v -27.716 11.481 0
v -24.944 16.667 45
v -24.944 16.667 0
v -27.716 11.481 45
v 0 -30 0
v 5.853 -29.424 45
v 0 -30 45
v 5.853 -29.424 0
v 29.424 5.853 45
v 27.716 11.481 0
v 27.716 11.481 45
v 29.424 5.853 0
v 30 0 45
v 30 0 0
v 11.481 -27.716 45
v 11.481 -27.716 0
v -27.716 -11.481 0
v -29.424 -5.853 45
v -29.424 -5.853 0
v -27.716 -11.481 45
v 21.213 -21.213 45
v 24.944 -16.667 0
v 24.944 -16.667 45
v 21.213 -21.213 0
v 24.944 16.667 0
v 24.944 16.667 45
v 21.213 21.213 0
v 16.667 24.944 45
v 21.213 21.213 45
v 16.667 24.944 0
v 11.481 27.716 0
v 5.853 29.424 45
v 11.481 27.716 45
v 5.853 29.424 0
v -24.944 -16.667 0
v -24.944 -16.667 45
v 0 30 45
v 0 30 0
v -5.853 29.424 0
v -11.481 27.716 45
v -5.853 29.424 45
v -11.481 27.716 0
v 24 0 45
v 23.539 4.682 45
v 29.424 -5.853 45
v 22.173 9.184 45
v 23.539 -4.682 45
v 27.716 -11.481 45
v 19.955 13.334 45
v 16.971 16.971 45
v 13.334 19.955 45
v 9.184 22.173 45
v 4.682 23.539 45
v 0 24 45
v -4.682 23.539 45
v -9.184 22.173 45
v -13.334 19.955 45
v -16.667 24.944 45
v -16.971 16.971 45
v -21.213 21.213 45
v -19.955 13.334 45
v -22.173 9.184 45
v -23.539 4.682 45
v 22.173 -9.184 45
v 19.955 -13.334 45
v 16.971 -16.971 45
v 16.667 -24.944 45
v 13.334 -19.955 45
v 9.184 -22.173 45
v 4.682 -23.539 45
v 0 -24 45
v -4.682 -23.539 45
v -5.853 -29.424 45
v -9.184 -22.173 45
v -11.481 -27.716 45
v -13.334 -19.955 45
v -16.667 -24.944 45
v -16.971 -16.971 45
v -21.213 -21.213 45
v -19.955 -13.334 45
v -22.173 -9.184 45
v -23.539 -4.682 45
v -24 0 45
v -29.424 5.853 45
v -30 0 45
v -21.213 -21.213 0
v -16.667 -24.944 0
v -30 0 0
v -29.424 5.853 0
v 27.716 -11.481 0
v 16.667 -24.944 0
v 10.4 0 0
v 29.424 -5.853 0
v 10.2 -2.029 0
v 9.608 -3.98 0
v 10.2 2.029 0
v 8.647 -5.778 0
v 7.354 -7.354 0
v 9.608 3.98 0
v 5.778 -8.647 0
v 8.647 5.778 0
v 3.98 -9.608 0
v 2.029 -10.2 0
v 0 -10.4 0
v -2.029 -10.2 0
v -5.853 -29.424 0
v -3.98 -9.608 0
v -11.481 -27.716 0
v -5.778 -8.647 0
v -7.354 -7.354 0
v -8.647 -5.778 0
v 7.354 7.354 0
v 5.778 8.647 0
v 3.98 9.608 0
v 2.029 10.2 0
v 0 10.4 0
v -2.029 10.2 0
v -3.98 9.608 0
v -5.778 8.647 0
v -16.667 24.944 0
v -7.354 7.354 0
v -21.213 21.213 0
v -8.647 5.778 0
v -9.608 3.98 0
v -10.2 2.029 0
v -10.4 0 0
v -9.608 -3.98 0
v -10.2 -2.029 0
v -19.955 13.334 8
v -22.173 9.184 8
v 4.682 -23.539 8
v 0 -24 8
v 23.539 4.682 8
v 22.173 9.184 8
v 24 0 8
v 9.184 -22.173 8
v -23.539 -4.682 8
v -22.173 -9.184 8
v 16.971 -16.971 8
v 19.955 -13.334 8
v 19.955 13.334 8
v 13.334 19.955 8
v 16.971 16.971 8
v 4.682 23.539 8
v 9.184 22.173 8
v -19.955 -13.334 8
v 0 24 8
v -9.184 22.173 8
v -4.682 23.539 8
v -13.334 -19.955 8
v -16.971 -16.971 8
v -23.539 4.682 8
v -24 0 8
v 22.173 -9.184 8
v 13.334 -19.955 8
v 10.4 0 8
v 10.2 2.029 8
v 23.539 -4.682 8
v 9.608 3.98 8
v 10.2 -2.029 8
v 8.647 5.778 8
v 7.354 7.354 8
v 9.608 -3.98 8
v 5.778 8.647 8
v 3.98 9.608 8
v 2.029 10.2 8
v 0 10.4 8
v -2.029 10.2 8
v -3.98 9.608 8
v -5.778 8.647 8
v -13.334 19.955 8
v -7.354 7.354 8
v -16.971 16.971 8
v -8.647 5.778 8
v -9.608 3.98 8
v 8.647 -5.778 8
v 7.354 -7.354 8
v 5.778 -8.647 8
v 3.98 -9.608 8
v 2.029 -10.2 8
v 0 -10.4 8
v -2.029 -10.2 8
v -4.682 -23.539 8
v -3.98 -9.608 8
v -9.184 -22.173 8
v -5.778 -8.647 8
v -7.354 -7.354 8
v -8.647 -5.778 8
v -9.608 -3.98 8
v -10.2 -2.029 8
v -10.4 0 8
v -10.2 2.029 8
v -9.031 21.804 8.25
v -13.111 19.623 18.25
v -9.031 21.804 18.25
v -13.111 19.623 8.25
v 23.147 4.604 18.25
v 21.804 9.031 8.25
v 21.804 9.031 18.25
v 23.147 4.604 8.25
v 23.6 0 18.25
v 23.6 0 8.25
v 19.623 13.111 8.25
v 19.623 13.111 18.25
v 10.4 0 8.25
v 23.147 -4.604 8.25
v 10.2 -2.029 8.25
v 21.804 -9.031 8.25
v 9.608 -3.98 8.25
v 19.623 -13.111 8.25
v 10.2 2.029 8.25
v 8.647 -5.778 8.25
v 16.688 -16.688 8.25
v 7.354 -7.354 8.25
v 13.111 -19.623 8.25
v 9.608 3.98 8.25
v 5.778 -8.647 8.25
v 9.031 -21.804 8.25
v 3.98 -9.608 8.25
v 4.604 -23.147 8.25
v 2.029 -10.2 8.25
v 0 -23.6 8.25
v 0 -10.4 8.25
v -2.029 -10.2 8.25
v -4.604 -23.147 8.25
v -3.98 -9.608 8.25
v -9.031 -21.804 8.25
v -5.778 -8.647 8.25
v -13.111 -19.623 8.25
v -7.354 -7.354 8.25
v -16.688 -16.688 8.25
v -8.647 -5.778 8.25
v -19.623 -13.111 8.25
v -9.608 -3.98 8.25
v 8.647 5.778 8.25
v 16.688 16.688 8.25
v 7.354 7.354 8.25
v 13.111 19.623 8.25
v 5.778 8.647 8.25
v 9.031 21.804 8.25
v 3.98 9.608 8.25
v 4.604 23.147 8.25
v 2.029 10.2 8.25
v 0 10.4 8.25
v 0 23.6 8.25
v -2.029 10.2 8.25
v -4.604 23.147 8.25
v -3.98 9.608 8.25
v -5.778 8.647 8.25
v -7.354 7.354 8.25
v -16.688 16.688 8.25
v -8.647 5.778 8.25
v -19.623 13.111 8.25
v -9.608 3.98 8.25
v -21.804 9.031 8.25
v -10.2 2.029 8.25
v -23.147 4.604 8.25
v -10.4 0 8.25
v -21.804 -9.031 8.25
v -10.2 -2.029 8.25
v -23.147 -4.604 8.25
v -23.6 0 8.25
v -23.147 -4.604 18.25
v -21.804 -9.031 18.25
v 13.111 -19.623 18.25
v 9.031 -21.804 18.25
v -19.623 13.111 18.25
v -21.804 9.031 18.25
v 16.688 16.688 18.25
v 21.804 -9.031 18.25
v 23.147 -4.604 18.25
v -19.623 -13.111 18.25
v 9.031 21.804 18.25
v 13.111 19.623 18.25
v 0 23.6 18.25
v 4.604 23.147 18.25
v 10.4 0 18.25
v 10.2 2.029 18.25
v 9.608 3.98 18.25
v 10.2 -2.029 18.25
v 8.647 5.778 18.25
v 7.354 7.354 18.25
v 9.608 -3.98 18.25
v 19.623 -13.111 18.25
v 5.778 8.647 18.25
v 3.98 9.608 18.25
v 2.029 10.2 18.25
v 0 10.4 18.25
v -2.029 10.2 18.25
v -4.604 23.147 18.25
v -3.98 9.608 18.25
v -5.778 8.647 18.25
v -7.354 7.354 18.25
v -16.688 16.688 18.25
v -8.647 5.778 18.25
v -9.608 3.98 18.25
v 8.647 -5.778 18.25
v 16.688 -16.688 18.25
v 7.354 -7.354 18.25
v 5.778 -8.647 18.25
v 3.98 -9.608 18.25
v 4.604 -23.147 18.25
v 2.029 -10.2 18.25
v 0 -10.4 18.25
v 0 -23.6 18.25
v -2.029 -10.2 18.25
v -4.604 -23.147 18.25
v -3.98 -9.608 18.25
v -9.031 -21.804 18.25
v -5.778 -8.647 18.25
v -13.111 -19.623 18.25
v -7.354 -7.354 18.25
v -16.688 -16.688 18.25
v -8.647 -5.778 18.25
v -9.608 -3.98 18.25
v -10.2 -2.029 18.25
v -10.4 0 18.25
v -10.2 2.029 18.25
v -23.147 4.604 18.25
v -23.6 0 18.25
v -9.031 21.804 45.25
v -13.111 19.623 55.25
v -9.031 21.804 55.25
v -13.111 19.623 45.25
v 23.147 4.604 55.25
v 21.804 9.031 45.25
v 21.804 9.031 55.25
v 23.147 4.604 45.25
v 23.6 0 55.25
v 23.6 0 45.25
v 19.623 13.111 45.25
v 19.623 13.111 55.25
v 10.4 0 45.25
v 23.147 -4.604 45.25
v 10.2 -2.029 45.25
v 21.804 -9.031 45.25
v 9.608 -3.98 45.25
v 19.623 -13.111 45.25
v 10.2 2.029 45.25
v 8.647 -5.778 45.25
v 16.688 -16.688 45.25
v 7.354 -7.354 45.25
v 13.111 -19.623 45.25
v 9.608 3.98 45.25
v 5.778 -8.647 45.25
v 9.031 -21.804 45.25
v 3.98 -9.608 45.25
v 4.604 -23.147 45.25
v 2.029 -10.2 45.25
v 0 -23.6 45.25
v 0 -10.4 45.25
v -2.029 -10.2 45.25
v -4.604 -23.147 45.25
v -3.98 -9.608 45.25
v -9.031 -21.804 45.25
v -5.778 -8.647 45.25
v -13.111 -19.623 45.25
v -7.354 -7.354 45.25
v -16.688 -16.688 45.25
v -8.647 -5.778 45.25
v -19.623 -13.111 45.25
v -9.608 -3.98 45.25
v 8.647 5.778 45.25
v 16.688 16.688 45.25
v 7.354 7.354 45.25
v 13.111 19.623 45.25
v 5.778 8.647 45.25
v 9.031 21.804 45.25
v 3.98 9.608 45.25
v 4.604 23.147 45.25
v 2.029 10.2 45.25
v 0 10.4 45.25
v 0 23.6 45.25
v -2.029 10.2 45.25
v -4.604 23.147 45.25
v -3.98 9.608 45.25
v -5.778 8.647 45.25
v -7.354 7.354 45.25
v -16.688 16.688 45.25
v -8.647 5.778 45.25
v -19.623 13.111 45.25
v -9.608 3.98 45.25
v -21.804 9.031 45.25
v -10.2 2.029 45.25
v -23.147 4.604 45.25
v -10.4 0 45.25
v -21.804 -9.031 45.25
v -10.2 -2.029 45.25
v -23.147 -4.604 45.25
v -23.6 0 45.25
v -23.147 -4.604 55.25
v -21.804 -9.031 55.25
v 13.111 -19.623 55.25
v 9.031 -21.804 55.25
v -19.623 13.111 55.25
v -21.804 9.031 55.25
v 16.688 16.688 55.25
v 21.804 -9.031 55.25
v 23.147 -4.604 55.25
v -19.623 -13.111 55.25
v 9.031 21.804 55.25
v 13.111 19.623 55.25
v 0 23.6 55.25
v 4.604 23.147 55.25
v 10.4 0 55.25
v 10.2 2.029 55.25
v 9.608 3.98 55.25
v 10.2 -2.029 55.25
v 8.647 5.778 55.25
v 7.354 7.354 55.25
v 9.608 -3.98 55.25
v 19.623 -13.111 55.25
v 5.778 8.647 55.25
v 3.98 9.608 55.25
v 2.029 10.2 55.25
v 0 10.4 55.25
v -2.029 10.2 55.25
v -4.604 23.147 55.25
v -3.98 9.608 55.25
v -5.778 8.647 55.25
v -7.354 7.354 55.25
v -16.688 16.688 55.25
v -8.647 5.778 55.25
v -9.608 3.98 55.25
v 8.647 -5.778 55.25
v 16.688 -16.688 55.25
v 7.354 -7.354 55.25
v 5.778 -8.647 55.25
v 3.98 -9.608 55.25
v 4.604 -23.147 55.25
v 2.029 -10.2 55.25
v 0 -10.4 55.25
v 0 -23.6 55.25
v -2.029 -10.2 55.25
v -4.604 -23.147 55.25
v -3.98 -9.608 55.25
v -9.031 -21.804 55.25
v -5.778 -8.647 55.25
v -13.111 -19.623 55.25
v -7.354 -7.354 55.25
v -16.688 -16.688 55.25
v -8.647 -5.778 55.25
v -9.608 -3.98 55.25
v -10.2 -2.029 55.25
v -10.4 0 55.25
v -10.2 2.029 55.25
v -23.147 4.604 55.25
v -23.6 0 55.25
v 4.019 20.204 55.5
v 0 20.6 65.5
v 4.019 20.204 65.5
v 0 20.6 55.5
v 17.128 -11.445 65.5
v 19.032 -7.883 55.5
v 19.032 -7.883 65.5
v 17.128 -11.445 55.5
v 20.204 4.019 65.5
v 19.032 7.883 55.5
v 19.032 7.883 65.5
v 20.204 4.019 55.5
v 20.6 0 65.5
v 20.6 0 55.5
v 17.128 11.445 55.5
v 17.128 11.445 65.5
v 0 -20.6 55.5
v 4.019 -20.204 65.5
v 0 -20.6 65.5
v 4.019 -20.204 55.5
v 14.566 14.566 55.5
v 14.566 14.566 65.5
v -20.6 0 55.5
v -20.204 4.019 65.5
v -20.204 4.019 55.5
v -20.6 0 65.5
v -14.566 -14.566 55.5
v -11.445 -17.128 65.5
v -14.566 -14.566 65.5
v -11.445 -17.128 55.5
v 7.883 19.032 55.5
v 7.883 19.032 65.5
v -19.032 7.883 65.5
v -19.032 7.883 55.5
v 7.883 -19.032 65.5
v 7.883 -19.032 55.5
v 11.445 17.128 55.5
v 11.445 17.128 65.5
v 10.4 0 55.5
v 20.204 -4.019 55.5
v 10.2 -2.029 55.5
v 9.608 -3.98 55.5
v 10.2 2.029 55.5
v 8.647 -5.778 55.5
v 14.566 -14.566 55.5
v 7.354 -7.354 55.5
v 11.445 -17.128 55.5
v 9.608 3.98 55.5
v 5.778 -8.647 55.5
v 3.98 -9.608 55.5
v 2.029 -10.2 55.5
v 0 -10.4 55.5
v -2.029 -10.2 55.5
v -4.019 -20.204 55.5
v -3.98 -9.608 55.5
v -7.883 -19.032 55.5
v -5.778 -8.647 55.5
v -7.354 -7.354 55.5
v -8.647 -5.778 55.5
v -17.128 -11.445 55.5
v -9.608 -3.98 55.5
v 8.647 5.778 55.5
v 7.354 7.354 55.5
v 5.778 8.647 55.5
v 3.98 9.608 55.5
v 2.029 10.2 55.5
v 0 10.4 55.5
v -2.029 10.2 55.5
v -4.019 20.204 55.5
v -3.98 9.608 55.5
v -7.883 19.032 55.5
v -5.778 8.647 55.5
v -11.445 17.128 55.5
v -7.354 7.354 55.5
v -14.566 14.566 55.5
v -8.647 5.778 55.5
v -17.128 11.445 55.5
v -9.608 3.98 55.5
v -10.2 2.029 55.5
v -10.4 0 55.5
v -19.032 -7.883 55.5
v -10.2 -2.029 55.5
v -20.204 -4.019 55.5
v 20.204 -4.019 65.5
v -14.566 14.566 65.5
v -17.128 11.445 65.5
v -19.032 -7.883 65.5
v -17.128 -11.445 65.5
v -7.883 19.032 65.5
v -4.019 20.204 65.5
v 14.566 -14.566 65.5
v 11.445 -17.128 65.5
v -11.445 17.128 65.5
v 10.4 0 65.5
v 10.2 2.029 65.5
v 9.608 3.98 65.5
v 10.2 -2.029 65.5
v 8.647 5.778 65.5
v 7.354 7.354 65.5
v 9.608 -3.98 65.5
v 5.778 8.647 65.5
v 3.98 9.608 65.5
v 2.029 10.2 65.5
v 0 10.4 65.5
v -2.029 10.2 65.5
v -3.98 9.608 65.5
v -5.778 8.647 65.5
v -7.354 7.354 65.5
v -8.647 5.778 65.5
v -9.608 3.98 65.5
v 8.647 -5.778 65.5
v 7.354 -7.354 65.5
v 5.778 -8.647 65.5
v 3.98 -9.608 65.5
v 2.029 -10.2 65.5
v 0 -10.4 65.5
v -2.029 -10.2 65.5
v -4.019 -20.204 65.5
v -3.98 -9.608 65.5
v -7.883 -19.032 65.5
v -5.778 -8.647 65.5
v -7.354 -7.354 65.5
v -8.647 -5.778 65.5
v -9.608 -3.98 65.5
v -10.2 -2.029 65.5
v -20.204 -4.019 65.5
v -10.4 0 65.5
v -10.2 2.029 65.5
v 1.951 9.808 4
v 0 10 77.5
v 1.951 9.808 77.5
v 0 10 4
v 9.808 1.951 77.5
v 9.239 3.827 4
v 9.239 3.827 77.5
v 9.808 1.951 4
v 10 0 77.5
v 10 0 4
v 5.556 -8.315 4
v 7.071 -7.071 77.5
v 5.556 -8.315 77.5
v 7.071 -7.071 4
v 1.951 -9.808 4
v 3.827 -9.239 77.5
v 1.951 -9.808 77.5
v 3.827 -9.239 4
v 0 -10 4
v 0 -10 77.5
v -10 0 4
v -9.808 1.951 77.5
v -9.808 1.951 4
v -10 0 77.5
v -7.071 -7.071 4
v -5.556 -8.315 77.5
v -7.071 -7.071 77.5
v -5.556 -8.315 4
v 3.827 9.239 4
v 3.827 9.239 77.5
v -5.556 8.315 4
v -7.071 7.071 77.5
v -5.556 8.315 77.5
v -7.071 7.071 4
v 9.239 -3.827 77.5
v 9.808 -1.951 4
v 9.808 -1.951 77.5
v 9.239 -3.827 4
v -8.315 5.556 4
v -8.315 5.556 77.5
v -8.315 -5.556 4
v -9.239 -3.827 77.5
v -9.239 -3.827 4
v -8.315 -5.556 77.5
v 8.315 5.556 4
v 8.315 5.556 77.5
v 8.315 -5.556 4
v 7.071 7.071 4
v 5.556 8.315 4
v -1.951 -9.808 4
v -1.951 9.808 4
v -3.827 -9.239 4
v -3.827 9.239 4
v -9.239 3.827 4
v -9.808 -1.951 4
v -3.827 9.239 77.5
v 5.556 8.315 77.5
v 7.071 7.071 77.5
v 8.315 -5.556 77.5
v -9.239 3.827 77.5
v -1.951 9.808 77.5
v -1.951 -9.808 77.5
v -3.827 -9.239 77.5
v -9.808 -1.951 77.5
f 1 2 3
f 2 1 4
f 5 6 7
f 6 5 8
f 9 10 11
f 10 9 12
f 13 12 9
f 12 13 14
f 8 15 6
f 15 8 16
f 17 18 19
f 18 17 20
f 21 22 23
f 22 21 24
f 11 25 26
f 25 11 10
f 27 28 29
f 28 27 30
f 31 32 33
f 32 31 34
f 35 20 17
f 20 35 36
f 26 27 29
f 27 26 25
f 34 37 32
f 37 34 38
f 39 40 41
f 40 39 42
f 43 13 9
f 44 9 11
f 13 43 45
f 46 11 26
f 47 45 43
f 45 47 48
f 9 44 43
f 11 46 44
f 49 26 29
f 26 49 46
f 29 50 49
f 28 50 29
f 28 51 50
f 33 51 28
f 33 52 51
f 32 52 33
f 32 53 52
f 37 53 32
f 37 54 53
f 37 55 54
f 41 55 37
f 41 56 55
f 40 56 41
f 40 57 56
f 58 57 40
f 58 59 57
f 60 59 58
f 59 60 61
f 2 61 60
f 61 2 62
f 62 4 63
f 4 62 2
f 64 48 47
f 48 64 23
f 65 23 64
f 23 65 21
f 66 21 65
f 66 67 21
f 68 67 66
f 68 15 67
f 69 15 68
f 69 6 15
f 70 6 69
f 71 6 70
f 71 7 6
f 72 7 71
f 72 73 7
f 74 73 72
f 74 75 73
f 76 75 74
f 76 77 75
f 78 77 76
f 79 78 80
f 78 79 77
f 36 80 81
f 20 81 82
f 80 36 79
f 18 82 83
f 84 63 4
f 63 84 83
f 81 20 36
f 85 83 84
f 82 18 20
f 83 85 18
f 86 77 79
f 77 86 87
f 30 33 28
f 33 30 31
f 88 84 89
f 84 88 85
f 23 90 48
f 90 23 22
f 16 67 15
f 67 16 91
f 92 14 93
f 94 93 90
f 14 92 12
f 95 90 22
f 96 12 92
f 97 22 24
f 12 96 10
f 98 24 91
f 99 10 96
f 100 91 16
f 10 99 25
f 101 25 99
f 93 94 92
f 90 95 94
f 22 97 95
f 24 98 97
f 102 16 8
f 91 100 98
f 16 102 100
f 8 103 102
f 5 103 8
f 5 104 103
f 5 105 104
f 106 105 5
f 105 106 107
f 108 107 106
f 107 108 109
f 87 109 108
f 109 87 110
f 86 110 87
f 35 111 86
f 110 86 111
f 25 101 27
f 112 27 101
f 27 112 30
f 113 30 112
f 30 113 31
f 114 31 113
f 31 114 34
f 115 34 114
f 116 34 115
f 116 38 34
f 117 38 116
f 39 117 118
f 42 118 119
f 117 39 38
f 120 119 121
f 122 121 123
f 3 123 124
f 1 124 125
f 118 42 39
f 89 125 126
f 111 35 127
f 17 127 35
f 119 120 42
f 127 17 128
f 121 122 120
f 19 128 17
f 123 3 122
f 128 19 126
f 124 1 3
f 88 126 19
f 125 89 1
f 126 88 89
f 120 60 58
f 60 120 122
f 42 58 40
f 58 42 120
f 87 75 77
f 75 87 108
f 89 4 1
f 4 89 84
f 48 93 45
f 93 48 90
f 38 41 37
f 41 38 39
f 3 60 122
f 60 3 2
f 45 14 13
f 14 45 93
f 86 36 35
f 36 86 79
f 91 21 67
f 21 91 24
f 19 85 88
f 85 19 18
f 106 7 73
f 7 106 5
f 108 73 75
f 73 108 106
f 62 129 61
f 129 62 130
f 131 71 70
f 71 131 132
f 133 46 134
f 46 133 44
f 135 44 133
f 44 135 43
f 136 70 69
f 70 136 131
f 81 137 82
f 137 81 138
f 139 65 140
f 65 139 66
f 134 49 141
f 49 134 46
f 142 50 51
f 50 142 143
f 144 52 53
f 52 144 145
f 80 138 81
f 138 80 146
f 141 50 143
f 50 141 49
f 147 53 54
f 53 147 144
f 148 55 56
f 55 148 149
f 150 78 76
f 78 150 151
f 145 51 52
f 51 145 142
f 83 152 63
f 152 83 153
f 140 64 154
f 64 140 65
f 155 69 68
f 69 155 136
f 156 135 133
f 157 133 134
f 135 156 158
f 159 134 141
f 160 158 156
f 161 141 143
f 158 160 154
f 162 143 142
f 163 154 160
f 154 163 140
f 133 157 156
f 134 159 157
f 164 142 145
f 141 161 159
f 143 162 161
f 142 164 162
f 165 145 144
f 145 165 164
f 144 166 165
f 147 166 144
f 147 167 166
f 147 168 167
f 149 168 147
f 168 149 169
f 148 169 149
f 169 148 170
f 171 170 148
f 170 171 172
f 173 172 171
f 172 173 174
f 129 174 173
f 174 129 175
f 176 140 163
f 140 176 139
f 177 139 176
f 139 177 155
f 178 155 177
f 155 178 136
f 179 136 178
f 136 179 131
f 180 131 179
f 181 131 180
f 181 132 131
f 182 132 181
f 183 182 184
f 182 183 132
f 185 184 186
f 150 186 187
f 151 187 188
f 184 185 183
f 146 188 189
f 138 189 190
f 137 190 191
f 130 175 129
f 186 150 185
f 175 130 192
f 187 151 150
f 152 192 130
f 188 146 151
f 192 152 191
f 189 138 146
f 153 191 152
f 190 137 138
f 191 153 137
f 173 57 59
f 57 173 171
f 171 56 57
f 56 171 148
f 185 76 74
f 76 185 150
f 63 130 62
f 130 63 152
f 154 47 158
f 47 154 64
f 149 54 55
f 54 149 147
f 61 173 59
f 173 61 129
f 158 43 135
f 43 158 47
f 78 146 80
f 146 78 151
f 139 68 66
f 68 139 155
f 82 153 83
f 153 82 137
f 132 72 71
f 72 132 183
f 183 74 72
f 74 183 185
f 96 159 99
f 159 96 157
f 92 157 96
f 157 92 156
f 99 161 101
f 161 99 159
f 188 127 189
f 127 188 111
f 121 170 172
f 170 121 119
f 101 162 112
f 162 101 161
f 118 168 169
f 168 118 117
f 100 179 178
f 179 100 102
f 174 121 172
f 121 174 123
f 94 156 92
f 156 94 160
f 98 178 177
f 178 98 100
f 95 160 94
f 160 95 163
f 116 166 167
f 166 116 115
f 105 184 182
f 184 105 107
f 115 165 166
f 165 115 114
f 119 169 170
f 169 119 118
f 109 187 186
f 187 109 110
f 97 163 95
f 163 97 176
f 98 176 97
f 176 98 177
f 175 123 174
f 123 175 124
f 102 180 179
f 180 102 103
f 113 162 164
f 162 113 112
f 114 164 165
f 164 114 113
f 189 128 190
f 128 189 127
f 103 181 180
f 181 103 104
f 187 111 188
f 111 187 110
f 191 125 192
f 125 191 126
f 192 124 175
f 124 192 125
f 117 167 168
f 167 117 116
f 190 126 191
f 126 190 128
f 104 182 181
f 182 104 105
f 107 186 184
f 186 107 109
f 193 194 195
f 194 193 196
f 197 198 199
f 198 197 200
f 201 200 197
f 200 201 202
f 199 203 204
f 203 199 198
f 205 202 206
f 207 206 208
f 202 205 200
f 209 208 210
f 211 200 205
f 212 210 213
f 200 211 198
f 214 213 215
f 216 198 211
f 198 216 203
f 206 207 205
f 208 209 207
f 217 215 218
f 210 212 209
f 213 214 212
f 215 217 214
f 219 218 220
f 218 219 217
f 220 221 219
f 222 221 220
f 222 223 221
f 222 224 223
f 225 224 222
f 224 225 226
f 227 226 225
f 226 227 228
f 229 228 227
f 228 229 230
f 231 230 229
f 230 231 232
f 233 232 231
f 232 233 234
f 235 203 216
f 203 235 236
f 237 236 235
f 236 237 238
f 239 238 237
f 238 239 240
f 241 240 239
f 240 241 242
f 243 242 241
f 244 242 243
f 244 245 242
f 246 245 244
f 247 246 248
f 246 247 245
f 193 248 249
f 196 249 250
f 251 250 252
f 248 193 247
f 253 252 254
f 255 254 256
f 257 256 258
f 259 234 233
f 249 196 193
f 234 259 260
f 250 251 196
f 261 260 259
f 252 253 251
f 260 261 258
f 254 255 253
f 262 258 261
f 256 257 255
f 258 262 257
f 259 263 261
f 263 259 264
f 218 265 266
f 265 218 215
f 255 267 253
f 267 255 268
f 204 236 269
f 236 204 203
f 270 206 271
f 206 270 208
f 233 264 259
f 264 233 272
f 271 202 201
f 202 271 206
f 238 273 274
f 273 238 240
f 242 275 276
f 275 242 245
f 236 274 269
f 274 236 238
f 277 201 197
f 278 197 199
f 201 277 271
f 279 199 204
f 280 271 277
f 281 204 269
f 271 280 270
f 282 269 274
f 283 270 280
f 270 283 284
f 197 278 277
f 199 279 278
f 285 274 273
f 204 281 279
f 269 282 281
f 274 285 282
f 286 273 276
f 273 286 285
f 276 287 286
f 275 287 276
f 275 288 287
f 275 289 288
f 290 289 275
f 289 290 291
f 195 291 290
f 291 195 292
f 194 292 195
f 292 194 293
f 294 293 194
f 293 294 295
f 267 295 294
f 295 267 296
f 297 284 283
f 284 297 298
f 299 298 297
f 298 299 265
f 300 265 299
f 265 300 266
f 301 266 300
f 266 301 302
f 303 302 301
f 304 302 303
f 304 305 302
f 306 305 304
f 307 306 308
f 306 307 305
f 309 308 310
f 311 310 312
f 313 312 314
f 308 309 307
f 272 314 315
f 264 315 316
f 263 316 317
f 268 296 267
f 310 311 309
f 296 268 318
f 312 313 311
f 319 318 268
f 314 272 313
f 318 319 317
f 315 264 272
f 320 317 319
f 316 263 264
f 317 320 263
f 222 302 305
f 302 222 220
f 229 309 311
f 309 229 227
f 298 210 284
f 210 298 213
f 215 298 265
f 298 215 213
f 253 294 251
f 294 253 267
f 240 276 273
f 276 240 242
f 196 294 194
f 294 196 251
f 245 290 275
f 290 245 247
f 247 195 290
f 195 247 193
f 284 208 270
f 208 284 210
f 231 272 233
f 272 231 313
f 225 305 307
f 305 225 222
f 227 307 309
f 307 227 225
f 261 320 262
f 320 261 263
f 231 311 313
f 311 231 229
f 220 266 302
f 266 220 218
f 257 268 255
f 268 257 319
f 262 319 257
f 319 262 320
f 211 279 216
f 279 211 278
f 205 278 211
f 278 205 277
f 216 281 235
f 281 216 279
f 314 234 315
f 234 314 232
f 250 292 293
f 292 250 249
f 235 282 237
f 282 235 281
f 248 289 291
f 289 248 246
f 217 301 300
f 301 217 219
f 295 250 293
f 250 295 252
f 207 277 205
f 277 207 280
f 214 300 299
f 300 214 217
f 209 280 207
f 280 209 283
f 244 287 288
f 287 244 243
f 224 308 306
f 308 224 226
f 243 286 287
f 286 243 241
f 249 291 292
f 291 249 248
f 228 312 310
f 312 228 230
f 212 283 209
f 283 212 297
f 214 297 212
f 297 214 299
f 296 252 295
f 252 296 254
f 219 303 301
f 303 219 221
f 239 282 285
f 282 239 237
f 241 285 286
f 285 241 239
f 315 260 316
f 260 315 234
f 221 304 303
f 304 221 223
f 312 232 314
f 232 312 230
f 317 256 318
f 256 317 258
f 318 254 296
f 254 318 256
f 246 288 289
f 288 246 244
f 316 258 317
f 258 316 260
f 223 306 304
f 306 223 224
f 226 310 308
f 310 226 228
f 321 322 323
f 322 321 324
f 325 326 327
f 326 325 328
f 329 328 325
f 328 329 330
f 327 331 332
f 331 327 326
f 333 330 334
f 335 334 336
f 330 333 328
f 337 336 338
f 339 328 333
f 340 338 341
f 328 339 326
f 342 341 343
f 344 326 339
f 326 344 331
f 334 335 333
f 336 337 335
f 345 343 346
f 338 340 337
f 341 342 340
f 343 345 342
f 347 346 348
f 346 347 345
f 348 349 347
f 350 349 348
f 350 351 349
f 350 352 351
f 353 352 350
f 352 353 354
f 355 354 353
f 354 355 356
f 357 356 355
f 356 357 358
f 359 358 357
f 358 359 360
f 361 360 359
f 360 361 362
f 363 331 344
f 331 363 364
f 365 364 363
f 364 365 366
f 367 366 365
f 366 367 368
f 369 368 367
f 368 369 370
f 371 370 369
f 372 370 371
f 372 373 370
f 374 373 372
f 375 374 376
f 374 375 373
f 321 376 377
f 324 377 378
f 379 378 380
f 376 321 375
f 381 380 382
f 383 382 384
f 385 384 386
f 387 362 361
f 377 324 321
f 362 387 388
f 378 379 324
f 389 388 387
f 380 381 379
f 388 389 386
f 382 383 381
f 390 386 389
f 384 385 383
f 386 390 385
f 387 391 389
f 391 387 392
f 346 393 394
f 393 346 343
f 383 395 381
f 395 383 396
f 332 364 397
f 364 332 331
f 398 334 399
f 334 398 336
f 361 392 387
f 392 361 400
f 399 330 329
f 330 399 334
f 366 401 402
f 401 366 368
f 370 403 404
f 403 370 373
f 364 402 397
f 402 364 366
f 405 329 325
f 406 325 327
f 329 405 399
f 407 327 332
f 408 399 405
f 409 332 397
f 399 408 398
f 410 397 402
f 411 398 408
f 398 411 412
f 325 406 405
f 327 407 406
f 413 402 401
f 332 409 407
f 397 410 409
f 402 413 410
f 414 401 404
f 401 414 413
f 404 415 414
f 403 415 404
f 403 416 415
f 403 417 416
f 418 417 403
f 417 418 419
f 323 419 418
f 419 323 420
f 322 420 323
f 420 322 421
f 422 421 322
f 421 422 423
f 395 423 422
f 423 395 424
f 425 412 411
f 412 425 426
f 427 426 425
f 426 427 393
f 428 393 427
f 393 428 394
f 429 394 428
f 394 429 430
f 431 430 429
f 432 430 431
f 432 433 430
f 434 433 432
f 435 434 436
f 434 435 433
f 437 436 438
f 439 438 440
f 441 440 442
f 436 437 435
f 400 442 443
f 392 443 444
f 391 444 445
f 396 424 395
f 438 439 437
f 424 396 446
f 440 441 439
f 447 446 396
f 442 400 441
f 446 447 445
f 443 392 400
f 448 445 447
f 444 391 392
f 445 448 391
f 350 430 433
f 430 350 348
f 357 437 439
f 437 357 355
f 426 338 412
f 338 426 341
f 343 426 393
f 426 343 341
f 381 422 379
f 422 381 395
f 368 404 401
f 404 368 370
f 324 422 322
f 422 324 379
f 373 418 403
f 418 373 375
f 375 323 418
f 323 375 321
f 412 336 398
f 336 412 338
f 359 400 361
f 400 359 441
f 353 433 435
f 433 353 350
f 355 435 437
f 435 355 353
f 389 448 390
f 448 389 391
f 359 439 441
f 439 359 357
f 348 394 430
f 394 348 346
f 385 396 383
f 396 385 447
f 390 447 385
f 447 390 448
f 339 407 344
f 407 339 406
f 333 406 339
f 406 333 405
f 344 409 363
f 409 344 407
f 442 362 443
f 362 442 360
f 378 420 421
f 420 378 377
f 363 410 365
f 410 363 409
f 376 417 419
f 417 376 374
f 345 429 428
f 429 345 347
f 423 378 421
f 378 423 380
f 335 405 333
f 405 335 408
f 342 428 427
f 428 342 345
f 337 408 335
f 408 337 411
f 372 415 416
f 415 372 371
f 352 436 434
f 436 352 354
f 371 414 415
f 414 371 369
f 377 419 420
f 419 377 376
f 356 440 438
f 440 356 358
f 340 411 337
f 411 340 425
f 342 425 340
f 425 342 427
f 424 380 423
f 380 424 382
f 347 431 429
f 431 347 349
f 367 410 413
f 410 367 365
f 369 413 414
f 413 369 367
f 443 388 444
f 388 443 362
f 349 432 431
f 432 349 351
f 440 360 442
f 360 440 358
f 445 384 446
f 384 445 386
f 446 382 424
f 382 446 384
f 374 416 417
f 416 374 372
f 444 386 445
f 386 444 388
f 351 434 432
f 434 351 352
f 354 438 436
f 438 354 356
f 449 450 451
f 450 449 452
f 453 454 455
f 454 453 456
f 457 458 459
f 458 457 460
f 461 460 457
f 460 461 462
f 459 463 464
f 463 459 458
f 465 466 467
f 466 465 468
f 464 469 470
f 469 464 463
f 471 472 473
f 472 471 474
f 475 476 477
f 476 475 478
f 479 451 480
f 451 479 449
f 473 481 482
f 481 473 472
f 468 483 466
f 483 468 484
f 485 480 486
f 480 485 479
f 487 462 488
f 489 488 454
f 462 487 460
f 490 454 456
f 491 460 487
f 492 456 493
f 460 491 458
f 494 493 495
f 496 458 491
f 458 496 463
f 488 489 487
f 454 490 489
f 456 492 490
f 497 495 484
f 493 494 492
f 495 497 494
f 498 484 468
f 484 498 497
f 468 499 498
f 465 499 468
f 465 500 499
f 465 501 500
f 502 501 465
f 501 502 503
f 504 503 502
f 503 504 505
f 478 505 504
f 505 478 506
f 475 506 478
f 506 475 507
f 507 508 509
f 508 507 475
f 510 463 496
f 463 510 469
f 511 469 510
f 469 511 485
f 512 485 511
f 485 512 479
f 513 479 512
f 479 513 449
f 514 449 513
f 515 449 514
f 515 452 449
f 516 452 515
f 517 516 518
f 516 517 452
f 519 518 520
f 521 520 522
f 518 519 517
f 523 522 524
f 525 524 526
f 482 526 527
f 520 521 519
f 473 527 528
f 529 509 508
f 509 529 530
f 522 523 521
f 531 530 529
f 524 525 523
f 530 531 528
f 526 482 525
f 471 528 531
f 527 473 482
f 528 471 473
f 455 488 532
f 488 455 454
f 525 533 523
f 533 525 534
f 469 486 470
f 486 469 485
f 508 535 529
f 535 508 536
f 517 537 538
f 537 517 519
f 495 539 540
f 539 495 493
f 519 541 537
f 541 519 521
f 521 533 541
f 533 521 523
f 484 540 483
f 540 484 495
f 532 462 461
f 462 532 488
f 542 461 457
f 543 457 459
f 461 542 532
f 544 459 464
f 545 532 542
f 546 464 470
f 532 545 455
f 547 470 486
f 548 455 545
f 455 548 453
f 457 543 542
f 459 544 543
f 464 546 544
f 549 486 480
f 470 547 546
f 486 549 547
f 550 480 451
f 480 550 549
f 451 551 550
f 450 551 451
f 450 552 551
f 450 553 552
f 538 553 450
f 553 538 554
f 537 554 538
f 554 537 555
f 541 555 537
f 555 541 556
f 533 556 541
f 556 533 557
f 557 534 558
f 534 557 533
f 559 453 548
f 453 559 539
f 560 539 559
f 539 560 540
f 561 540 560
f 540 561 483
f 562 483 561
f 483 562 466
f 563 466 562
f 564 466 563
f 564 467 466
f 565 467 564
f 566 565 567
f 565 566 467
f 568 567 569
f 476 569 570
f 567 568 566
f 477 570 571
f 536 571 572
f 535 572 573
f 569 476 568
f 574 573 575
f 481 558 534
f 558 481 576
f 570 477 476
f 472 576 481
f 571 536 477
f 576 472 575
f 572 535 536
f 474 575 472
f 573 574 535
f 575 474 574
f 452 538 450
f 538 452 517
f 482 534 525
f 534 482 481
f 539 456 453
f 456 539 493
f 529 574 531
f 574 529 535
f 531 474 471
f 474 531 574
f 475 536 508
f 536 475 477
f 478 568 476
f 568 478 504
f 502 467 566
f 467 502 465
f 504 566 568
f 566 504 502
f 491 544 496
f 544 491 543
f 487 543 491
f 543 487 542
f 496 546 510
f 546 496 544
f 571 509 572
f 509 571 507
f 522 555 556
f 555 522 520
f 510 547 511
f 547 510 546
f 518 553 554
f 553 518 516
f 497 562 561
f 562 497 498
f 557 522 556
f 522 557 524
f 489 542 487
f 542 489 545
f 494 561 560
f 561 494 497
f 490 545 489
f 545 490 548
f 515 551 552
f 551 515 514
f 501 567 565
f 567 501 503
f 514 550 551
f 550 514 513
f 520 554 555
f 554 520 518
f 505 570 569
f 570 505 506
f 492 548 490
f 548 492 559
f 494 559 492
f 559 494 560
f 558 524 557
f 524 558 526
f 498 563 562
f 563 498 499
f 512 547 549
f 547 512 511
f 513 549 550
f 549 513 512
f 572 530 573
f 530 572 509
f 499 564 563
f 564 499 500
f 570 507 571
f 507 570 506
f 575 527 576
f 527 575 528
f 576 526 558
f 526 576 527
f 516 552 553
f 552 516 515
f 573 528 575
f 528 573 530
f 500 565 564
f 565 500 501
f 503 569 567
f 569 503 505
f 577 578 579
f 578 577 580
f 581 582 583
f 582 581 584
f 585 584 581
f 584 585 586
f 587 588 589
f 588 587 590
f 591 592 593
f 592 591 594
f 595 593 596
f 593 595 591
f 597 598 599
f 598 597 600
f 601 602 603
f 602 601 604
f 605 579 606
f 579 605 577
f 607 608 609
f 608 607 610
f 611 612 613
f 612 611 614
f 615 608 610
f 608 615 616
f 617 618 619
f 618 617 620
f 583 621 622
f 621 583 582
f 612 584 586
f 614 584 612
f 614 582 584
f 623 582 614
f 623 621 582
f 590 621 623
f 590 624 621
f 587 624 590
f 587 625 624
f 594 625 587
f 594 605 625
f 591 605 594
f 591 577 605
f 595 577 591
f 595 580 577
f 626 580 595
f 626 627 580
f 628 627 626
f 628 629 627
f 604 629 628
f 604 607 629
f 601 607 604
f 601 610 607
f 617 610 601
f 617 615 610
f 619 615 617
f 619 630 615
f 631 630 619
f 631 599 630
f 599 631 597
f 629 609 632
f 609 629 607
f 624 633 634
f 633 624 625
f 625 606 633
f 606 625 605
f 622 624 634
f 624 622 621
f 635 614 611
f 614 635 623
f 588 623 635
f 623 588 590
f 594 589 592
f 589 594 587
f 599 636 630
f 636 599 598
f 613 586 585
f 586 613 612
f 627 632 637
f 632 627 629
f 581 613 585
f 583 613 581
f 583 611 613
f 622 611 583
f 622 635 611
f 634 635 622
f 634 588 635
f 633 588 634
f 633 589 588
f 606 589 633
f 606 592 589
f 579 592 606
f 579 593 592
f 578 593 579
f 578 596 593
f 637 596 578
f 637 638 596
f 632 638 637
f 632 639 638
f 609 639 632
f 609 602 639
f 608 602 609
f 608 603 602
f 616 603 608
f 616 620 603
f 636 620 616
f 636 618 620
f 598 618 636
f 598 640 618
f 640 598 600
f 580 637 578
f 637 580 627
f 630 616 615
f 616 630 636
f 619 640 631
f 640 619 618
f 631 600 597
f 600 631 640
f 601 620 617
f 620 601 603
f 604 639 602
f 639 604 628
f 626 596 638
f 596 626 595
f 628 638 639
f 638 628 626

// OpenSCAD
$fn = 32;

// ------------------------------------------------------------------------
// Bearing housing: housing d60, two bearings and a shaft
// Every part is its own module, assembly() places them once.
// ------------------------------------------------------------------------

// --- part 1 ---
module housing() {
  difference() {
    cylinder(h = 45, d = 60);
    translate([0, 0, 8]) cylinder(h = 38, d = 48);
    translate([0, 0, -1]) cylinder(h = 10, d = 20.8);
  }
}

// --- part 2 ---
module bearing_lower() {
  difference() {
      translate([0, 0, 0]) cylinder(h = 10, d = 47.2);
      translate([0, 0, -1]) cylinder(h = 12, d = 20.8);
    }
}

// --- part 3 ---
module bearing_upper() {
  difference() {
      translate([0, 0, 0]) cylinder(h = 10, d = 47.2);
      translate([0, 0, -1]) cylinder(h = 12, d = 20.8);
    }
}

// --- part 4 ---
module spacer() {
  difference() {
      translate([0, 0, 0]) cylinder(h = 10, d = 41.2);
      translate([0, 0, -1]) cylinder(h = 12, d = 20.8);
    }
}

// --- part 5 ---
module shaft() {
  translate([0, 0, -36.75]) cylinder(h = 73.5, d = 20);
}

// --- assembly ---
module assembly() {
  translate([0, 0, 0]) rotate([0, 0, 0]) housing();
  translate([0, 0, 8.25]) rotate([0, 0, 0]) bearing_lower();
  translate([0, 0, 45.25]) rotate([0, 0, 0]) bearing_upper();
  translate([0, 0, 55.5]) rotate([0, 0, 0]) spacer();
  translate([0, 0, 40.75]) rotate([0, 0, 0]) shaft();
}

assembly();
